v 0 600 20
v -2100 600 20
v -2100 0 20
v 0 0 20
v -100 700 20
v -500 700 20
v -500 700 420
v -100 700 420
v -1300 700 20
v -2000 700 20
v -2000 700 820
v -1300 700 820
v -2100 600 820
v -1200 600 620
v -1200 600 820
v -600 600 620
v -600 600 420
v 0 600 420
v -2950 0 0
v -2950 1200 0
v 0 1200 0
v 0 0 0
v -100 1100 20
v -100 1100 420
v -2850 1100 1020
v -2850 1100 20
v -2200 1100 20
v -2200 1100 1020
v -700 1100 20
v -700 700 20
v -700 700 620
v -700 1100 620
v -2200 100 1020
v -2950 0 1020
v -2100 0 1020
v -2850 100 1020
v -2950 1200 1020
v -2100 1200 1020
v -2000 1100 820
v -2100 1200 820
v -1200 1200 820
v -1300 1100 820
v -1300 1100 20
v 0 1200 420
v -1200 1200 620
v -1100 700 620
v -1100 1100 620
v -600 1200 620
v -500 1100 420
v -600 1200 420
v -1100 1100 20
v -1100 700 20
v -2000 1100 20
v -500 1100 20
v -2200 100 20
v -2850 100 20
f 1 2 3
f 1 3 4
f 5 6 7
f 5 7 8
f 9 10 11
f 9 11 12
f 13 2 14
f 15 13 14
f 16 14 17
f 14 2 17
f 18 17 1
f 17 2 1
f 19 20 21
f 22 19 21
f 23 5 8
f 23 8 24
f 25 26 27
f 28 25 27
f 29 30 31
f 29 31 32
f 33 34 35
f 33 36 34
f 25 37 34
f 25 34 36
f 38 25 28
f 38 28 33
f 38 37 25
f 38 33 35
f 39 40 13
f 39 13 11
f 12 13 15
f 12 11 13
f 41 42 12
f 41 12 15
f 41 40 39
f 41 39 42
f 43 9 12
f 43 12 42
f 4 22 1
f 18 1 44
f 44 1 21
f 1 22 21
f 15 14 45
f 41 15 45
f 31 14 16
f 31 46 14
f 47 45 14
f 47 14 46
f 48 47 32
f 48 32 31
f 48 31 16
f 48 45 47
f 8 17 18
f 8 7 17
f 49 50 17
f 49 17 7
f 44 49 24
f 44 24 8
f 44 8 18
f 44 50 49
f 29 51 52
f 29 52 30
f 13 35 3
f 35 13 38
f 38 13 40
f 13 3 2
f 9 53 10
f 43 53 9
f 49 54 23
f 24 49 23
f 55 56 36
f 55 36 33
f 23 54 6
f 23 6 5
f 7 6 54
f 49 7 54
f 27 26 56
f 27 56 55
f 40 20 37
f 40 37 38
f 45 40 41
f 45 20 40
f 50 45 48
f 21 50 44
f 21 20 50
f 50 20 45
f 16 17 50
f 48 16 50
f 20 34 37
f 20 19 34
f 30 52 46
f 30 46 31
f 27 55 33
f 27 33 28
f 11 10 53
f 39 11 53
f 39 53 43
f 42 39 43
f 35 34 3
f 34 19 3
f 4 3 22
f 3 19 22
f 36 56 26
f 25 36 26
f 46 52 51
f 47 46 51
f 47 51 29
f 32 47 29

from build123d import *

# Parameters (mm, degrees)
F1_DEPTH = 20
F2_W     = 600
F2_H     = 600
F2_W_2   = 400
F2_H_2   = 400
F3_DEPTH = 400
F4_W     = 600
F4_H     = 600
F4_W_2   = 400
F4_H_2   = 400
F5_DEPTH = 600
F6_W     = 900
F6_H     = 600
F6_W_2   = 700
F6_H_2   = 400
F7_DEPTH = 800
F8_W     = 850
F8_H     = 1200
F8_W_2   = 650
F8_H_2   = 1000
F9_DEPTH = 1000


with BuildPart() as f1:
    # F0 (on Top) → F1 (new body)
    with BuildSketch(Plane.XY):
        Polygon((-2563.636364, 0), (0, 0), (0, 1200), (-2950, 1200), (-2950, 0), align=None)
    extrude(amount=F1_DEPTH)

    # F2 (on face) → F3 (join)
    with BuildSketch(Plane.XY.offset(20)):
        with Locations((-300, 900)):
            Rectangle(F2_W, F2_H)
        with Locations((-300, 900)):
            Rectangle(F2_W_2, F2_H_2, mode=Mode.SUBTRACT)
    extrude(amount=F3_DEPTH)

    # F4 (on face) → F5 (join)
    with BuildSketch(Plane.XY.offset(20)):
        with Locations((-900, 900)):
            Rectangle(F4_W, F4_H)
        with Locations((-900, 900)):
            Rectangle(F4_W_2, F4_H_2, mode=Mode.SUBTRACT)
    extrude(amount=F5_DEPTH)

    # F6 (on face) → F7 (join)
    with BuildSketch(Plane.XY.offset(20)):
        with Locations((-1650, 900)):
            Rectangle(F6_W, F6_H)
        with Locations((-1650, 900)):
            Rectangle(F6_W_2, F6_H_2, mode=Mode.SUBTRACT)
    extrude(amount=F7_DEPTH)

    # F8 (on face) → F9 (join)
    with BuildSketch(Plane.XY.offset(20)):
        with Locations((-2525, 600)):
            Rectangle(F8_W, F8_H)
        with Locations((-2525, 600)):
            Rectangle(F8_W_2, F8_H_2, mode=Mode.SUBTRACT)
    extrude(amount=F9_DEPTH)


solid = f1.part
